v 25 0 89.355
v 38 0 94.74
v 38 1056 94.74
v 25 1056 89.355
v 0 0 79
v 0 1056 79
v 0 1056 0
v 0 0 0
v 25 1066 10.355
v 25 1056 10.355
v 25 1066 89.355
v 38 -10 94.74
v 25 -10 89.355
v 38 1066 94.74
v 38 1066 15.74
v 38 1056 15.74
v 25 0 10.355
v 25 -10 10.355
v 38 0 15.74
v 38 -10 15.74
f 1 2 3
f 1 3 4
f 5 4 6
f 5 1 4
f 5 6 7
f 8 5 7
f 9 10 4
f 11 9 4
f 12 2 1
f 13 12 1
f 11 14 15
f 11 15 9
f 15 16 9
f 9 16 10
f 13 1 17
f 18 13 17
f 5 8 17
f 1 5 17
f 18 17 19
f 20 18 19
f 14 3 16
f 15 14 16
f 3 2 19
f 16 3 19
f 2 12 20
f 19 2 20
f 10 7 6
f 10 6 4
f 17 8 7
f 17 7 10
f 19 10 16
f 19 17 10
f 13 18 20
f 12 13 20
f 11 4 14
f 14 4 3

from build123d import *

# Parameters (mm, degrees)
F1_DEPTH = 1056
F3_DEPTH = 10
F5_DEPTH = 10


with BuildPart() as f1:
    # F0 (on Front) → F1 (new body)
    with BuildSketch(Plane.XZ):
        Polygon((0, 79), (0, 0), (38, 15.740115), (38, 94.740115), align=None)
    extrude(amount=-F1_DEPTH)

    # F2 (on face) → F3 (join)
    with BuildSketch(Plane.XZ):
        Polygon((38, 94.740115), (25, 89.355339), (25, 10.355339), (38, 15.740115), align=None)
    extrude(amount=F3_DEPTH)

    # F4 (on face) → F5 (join)
    with BuildSketch(Plane(origin=(0, 1056, 0), x_dir=(-1, 0, 0), z_dir=(0, 1, 0))):
        Polygon((-38, 94.740115), (-38, 15.740115), (-25, 10.355339), (-25, 89.355339), align=None)
    extrude(amount=F5_DEPTH)


solid = f1.part
